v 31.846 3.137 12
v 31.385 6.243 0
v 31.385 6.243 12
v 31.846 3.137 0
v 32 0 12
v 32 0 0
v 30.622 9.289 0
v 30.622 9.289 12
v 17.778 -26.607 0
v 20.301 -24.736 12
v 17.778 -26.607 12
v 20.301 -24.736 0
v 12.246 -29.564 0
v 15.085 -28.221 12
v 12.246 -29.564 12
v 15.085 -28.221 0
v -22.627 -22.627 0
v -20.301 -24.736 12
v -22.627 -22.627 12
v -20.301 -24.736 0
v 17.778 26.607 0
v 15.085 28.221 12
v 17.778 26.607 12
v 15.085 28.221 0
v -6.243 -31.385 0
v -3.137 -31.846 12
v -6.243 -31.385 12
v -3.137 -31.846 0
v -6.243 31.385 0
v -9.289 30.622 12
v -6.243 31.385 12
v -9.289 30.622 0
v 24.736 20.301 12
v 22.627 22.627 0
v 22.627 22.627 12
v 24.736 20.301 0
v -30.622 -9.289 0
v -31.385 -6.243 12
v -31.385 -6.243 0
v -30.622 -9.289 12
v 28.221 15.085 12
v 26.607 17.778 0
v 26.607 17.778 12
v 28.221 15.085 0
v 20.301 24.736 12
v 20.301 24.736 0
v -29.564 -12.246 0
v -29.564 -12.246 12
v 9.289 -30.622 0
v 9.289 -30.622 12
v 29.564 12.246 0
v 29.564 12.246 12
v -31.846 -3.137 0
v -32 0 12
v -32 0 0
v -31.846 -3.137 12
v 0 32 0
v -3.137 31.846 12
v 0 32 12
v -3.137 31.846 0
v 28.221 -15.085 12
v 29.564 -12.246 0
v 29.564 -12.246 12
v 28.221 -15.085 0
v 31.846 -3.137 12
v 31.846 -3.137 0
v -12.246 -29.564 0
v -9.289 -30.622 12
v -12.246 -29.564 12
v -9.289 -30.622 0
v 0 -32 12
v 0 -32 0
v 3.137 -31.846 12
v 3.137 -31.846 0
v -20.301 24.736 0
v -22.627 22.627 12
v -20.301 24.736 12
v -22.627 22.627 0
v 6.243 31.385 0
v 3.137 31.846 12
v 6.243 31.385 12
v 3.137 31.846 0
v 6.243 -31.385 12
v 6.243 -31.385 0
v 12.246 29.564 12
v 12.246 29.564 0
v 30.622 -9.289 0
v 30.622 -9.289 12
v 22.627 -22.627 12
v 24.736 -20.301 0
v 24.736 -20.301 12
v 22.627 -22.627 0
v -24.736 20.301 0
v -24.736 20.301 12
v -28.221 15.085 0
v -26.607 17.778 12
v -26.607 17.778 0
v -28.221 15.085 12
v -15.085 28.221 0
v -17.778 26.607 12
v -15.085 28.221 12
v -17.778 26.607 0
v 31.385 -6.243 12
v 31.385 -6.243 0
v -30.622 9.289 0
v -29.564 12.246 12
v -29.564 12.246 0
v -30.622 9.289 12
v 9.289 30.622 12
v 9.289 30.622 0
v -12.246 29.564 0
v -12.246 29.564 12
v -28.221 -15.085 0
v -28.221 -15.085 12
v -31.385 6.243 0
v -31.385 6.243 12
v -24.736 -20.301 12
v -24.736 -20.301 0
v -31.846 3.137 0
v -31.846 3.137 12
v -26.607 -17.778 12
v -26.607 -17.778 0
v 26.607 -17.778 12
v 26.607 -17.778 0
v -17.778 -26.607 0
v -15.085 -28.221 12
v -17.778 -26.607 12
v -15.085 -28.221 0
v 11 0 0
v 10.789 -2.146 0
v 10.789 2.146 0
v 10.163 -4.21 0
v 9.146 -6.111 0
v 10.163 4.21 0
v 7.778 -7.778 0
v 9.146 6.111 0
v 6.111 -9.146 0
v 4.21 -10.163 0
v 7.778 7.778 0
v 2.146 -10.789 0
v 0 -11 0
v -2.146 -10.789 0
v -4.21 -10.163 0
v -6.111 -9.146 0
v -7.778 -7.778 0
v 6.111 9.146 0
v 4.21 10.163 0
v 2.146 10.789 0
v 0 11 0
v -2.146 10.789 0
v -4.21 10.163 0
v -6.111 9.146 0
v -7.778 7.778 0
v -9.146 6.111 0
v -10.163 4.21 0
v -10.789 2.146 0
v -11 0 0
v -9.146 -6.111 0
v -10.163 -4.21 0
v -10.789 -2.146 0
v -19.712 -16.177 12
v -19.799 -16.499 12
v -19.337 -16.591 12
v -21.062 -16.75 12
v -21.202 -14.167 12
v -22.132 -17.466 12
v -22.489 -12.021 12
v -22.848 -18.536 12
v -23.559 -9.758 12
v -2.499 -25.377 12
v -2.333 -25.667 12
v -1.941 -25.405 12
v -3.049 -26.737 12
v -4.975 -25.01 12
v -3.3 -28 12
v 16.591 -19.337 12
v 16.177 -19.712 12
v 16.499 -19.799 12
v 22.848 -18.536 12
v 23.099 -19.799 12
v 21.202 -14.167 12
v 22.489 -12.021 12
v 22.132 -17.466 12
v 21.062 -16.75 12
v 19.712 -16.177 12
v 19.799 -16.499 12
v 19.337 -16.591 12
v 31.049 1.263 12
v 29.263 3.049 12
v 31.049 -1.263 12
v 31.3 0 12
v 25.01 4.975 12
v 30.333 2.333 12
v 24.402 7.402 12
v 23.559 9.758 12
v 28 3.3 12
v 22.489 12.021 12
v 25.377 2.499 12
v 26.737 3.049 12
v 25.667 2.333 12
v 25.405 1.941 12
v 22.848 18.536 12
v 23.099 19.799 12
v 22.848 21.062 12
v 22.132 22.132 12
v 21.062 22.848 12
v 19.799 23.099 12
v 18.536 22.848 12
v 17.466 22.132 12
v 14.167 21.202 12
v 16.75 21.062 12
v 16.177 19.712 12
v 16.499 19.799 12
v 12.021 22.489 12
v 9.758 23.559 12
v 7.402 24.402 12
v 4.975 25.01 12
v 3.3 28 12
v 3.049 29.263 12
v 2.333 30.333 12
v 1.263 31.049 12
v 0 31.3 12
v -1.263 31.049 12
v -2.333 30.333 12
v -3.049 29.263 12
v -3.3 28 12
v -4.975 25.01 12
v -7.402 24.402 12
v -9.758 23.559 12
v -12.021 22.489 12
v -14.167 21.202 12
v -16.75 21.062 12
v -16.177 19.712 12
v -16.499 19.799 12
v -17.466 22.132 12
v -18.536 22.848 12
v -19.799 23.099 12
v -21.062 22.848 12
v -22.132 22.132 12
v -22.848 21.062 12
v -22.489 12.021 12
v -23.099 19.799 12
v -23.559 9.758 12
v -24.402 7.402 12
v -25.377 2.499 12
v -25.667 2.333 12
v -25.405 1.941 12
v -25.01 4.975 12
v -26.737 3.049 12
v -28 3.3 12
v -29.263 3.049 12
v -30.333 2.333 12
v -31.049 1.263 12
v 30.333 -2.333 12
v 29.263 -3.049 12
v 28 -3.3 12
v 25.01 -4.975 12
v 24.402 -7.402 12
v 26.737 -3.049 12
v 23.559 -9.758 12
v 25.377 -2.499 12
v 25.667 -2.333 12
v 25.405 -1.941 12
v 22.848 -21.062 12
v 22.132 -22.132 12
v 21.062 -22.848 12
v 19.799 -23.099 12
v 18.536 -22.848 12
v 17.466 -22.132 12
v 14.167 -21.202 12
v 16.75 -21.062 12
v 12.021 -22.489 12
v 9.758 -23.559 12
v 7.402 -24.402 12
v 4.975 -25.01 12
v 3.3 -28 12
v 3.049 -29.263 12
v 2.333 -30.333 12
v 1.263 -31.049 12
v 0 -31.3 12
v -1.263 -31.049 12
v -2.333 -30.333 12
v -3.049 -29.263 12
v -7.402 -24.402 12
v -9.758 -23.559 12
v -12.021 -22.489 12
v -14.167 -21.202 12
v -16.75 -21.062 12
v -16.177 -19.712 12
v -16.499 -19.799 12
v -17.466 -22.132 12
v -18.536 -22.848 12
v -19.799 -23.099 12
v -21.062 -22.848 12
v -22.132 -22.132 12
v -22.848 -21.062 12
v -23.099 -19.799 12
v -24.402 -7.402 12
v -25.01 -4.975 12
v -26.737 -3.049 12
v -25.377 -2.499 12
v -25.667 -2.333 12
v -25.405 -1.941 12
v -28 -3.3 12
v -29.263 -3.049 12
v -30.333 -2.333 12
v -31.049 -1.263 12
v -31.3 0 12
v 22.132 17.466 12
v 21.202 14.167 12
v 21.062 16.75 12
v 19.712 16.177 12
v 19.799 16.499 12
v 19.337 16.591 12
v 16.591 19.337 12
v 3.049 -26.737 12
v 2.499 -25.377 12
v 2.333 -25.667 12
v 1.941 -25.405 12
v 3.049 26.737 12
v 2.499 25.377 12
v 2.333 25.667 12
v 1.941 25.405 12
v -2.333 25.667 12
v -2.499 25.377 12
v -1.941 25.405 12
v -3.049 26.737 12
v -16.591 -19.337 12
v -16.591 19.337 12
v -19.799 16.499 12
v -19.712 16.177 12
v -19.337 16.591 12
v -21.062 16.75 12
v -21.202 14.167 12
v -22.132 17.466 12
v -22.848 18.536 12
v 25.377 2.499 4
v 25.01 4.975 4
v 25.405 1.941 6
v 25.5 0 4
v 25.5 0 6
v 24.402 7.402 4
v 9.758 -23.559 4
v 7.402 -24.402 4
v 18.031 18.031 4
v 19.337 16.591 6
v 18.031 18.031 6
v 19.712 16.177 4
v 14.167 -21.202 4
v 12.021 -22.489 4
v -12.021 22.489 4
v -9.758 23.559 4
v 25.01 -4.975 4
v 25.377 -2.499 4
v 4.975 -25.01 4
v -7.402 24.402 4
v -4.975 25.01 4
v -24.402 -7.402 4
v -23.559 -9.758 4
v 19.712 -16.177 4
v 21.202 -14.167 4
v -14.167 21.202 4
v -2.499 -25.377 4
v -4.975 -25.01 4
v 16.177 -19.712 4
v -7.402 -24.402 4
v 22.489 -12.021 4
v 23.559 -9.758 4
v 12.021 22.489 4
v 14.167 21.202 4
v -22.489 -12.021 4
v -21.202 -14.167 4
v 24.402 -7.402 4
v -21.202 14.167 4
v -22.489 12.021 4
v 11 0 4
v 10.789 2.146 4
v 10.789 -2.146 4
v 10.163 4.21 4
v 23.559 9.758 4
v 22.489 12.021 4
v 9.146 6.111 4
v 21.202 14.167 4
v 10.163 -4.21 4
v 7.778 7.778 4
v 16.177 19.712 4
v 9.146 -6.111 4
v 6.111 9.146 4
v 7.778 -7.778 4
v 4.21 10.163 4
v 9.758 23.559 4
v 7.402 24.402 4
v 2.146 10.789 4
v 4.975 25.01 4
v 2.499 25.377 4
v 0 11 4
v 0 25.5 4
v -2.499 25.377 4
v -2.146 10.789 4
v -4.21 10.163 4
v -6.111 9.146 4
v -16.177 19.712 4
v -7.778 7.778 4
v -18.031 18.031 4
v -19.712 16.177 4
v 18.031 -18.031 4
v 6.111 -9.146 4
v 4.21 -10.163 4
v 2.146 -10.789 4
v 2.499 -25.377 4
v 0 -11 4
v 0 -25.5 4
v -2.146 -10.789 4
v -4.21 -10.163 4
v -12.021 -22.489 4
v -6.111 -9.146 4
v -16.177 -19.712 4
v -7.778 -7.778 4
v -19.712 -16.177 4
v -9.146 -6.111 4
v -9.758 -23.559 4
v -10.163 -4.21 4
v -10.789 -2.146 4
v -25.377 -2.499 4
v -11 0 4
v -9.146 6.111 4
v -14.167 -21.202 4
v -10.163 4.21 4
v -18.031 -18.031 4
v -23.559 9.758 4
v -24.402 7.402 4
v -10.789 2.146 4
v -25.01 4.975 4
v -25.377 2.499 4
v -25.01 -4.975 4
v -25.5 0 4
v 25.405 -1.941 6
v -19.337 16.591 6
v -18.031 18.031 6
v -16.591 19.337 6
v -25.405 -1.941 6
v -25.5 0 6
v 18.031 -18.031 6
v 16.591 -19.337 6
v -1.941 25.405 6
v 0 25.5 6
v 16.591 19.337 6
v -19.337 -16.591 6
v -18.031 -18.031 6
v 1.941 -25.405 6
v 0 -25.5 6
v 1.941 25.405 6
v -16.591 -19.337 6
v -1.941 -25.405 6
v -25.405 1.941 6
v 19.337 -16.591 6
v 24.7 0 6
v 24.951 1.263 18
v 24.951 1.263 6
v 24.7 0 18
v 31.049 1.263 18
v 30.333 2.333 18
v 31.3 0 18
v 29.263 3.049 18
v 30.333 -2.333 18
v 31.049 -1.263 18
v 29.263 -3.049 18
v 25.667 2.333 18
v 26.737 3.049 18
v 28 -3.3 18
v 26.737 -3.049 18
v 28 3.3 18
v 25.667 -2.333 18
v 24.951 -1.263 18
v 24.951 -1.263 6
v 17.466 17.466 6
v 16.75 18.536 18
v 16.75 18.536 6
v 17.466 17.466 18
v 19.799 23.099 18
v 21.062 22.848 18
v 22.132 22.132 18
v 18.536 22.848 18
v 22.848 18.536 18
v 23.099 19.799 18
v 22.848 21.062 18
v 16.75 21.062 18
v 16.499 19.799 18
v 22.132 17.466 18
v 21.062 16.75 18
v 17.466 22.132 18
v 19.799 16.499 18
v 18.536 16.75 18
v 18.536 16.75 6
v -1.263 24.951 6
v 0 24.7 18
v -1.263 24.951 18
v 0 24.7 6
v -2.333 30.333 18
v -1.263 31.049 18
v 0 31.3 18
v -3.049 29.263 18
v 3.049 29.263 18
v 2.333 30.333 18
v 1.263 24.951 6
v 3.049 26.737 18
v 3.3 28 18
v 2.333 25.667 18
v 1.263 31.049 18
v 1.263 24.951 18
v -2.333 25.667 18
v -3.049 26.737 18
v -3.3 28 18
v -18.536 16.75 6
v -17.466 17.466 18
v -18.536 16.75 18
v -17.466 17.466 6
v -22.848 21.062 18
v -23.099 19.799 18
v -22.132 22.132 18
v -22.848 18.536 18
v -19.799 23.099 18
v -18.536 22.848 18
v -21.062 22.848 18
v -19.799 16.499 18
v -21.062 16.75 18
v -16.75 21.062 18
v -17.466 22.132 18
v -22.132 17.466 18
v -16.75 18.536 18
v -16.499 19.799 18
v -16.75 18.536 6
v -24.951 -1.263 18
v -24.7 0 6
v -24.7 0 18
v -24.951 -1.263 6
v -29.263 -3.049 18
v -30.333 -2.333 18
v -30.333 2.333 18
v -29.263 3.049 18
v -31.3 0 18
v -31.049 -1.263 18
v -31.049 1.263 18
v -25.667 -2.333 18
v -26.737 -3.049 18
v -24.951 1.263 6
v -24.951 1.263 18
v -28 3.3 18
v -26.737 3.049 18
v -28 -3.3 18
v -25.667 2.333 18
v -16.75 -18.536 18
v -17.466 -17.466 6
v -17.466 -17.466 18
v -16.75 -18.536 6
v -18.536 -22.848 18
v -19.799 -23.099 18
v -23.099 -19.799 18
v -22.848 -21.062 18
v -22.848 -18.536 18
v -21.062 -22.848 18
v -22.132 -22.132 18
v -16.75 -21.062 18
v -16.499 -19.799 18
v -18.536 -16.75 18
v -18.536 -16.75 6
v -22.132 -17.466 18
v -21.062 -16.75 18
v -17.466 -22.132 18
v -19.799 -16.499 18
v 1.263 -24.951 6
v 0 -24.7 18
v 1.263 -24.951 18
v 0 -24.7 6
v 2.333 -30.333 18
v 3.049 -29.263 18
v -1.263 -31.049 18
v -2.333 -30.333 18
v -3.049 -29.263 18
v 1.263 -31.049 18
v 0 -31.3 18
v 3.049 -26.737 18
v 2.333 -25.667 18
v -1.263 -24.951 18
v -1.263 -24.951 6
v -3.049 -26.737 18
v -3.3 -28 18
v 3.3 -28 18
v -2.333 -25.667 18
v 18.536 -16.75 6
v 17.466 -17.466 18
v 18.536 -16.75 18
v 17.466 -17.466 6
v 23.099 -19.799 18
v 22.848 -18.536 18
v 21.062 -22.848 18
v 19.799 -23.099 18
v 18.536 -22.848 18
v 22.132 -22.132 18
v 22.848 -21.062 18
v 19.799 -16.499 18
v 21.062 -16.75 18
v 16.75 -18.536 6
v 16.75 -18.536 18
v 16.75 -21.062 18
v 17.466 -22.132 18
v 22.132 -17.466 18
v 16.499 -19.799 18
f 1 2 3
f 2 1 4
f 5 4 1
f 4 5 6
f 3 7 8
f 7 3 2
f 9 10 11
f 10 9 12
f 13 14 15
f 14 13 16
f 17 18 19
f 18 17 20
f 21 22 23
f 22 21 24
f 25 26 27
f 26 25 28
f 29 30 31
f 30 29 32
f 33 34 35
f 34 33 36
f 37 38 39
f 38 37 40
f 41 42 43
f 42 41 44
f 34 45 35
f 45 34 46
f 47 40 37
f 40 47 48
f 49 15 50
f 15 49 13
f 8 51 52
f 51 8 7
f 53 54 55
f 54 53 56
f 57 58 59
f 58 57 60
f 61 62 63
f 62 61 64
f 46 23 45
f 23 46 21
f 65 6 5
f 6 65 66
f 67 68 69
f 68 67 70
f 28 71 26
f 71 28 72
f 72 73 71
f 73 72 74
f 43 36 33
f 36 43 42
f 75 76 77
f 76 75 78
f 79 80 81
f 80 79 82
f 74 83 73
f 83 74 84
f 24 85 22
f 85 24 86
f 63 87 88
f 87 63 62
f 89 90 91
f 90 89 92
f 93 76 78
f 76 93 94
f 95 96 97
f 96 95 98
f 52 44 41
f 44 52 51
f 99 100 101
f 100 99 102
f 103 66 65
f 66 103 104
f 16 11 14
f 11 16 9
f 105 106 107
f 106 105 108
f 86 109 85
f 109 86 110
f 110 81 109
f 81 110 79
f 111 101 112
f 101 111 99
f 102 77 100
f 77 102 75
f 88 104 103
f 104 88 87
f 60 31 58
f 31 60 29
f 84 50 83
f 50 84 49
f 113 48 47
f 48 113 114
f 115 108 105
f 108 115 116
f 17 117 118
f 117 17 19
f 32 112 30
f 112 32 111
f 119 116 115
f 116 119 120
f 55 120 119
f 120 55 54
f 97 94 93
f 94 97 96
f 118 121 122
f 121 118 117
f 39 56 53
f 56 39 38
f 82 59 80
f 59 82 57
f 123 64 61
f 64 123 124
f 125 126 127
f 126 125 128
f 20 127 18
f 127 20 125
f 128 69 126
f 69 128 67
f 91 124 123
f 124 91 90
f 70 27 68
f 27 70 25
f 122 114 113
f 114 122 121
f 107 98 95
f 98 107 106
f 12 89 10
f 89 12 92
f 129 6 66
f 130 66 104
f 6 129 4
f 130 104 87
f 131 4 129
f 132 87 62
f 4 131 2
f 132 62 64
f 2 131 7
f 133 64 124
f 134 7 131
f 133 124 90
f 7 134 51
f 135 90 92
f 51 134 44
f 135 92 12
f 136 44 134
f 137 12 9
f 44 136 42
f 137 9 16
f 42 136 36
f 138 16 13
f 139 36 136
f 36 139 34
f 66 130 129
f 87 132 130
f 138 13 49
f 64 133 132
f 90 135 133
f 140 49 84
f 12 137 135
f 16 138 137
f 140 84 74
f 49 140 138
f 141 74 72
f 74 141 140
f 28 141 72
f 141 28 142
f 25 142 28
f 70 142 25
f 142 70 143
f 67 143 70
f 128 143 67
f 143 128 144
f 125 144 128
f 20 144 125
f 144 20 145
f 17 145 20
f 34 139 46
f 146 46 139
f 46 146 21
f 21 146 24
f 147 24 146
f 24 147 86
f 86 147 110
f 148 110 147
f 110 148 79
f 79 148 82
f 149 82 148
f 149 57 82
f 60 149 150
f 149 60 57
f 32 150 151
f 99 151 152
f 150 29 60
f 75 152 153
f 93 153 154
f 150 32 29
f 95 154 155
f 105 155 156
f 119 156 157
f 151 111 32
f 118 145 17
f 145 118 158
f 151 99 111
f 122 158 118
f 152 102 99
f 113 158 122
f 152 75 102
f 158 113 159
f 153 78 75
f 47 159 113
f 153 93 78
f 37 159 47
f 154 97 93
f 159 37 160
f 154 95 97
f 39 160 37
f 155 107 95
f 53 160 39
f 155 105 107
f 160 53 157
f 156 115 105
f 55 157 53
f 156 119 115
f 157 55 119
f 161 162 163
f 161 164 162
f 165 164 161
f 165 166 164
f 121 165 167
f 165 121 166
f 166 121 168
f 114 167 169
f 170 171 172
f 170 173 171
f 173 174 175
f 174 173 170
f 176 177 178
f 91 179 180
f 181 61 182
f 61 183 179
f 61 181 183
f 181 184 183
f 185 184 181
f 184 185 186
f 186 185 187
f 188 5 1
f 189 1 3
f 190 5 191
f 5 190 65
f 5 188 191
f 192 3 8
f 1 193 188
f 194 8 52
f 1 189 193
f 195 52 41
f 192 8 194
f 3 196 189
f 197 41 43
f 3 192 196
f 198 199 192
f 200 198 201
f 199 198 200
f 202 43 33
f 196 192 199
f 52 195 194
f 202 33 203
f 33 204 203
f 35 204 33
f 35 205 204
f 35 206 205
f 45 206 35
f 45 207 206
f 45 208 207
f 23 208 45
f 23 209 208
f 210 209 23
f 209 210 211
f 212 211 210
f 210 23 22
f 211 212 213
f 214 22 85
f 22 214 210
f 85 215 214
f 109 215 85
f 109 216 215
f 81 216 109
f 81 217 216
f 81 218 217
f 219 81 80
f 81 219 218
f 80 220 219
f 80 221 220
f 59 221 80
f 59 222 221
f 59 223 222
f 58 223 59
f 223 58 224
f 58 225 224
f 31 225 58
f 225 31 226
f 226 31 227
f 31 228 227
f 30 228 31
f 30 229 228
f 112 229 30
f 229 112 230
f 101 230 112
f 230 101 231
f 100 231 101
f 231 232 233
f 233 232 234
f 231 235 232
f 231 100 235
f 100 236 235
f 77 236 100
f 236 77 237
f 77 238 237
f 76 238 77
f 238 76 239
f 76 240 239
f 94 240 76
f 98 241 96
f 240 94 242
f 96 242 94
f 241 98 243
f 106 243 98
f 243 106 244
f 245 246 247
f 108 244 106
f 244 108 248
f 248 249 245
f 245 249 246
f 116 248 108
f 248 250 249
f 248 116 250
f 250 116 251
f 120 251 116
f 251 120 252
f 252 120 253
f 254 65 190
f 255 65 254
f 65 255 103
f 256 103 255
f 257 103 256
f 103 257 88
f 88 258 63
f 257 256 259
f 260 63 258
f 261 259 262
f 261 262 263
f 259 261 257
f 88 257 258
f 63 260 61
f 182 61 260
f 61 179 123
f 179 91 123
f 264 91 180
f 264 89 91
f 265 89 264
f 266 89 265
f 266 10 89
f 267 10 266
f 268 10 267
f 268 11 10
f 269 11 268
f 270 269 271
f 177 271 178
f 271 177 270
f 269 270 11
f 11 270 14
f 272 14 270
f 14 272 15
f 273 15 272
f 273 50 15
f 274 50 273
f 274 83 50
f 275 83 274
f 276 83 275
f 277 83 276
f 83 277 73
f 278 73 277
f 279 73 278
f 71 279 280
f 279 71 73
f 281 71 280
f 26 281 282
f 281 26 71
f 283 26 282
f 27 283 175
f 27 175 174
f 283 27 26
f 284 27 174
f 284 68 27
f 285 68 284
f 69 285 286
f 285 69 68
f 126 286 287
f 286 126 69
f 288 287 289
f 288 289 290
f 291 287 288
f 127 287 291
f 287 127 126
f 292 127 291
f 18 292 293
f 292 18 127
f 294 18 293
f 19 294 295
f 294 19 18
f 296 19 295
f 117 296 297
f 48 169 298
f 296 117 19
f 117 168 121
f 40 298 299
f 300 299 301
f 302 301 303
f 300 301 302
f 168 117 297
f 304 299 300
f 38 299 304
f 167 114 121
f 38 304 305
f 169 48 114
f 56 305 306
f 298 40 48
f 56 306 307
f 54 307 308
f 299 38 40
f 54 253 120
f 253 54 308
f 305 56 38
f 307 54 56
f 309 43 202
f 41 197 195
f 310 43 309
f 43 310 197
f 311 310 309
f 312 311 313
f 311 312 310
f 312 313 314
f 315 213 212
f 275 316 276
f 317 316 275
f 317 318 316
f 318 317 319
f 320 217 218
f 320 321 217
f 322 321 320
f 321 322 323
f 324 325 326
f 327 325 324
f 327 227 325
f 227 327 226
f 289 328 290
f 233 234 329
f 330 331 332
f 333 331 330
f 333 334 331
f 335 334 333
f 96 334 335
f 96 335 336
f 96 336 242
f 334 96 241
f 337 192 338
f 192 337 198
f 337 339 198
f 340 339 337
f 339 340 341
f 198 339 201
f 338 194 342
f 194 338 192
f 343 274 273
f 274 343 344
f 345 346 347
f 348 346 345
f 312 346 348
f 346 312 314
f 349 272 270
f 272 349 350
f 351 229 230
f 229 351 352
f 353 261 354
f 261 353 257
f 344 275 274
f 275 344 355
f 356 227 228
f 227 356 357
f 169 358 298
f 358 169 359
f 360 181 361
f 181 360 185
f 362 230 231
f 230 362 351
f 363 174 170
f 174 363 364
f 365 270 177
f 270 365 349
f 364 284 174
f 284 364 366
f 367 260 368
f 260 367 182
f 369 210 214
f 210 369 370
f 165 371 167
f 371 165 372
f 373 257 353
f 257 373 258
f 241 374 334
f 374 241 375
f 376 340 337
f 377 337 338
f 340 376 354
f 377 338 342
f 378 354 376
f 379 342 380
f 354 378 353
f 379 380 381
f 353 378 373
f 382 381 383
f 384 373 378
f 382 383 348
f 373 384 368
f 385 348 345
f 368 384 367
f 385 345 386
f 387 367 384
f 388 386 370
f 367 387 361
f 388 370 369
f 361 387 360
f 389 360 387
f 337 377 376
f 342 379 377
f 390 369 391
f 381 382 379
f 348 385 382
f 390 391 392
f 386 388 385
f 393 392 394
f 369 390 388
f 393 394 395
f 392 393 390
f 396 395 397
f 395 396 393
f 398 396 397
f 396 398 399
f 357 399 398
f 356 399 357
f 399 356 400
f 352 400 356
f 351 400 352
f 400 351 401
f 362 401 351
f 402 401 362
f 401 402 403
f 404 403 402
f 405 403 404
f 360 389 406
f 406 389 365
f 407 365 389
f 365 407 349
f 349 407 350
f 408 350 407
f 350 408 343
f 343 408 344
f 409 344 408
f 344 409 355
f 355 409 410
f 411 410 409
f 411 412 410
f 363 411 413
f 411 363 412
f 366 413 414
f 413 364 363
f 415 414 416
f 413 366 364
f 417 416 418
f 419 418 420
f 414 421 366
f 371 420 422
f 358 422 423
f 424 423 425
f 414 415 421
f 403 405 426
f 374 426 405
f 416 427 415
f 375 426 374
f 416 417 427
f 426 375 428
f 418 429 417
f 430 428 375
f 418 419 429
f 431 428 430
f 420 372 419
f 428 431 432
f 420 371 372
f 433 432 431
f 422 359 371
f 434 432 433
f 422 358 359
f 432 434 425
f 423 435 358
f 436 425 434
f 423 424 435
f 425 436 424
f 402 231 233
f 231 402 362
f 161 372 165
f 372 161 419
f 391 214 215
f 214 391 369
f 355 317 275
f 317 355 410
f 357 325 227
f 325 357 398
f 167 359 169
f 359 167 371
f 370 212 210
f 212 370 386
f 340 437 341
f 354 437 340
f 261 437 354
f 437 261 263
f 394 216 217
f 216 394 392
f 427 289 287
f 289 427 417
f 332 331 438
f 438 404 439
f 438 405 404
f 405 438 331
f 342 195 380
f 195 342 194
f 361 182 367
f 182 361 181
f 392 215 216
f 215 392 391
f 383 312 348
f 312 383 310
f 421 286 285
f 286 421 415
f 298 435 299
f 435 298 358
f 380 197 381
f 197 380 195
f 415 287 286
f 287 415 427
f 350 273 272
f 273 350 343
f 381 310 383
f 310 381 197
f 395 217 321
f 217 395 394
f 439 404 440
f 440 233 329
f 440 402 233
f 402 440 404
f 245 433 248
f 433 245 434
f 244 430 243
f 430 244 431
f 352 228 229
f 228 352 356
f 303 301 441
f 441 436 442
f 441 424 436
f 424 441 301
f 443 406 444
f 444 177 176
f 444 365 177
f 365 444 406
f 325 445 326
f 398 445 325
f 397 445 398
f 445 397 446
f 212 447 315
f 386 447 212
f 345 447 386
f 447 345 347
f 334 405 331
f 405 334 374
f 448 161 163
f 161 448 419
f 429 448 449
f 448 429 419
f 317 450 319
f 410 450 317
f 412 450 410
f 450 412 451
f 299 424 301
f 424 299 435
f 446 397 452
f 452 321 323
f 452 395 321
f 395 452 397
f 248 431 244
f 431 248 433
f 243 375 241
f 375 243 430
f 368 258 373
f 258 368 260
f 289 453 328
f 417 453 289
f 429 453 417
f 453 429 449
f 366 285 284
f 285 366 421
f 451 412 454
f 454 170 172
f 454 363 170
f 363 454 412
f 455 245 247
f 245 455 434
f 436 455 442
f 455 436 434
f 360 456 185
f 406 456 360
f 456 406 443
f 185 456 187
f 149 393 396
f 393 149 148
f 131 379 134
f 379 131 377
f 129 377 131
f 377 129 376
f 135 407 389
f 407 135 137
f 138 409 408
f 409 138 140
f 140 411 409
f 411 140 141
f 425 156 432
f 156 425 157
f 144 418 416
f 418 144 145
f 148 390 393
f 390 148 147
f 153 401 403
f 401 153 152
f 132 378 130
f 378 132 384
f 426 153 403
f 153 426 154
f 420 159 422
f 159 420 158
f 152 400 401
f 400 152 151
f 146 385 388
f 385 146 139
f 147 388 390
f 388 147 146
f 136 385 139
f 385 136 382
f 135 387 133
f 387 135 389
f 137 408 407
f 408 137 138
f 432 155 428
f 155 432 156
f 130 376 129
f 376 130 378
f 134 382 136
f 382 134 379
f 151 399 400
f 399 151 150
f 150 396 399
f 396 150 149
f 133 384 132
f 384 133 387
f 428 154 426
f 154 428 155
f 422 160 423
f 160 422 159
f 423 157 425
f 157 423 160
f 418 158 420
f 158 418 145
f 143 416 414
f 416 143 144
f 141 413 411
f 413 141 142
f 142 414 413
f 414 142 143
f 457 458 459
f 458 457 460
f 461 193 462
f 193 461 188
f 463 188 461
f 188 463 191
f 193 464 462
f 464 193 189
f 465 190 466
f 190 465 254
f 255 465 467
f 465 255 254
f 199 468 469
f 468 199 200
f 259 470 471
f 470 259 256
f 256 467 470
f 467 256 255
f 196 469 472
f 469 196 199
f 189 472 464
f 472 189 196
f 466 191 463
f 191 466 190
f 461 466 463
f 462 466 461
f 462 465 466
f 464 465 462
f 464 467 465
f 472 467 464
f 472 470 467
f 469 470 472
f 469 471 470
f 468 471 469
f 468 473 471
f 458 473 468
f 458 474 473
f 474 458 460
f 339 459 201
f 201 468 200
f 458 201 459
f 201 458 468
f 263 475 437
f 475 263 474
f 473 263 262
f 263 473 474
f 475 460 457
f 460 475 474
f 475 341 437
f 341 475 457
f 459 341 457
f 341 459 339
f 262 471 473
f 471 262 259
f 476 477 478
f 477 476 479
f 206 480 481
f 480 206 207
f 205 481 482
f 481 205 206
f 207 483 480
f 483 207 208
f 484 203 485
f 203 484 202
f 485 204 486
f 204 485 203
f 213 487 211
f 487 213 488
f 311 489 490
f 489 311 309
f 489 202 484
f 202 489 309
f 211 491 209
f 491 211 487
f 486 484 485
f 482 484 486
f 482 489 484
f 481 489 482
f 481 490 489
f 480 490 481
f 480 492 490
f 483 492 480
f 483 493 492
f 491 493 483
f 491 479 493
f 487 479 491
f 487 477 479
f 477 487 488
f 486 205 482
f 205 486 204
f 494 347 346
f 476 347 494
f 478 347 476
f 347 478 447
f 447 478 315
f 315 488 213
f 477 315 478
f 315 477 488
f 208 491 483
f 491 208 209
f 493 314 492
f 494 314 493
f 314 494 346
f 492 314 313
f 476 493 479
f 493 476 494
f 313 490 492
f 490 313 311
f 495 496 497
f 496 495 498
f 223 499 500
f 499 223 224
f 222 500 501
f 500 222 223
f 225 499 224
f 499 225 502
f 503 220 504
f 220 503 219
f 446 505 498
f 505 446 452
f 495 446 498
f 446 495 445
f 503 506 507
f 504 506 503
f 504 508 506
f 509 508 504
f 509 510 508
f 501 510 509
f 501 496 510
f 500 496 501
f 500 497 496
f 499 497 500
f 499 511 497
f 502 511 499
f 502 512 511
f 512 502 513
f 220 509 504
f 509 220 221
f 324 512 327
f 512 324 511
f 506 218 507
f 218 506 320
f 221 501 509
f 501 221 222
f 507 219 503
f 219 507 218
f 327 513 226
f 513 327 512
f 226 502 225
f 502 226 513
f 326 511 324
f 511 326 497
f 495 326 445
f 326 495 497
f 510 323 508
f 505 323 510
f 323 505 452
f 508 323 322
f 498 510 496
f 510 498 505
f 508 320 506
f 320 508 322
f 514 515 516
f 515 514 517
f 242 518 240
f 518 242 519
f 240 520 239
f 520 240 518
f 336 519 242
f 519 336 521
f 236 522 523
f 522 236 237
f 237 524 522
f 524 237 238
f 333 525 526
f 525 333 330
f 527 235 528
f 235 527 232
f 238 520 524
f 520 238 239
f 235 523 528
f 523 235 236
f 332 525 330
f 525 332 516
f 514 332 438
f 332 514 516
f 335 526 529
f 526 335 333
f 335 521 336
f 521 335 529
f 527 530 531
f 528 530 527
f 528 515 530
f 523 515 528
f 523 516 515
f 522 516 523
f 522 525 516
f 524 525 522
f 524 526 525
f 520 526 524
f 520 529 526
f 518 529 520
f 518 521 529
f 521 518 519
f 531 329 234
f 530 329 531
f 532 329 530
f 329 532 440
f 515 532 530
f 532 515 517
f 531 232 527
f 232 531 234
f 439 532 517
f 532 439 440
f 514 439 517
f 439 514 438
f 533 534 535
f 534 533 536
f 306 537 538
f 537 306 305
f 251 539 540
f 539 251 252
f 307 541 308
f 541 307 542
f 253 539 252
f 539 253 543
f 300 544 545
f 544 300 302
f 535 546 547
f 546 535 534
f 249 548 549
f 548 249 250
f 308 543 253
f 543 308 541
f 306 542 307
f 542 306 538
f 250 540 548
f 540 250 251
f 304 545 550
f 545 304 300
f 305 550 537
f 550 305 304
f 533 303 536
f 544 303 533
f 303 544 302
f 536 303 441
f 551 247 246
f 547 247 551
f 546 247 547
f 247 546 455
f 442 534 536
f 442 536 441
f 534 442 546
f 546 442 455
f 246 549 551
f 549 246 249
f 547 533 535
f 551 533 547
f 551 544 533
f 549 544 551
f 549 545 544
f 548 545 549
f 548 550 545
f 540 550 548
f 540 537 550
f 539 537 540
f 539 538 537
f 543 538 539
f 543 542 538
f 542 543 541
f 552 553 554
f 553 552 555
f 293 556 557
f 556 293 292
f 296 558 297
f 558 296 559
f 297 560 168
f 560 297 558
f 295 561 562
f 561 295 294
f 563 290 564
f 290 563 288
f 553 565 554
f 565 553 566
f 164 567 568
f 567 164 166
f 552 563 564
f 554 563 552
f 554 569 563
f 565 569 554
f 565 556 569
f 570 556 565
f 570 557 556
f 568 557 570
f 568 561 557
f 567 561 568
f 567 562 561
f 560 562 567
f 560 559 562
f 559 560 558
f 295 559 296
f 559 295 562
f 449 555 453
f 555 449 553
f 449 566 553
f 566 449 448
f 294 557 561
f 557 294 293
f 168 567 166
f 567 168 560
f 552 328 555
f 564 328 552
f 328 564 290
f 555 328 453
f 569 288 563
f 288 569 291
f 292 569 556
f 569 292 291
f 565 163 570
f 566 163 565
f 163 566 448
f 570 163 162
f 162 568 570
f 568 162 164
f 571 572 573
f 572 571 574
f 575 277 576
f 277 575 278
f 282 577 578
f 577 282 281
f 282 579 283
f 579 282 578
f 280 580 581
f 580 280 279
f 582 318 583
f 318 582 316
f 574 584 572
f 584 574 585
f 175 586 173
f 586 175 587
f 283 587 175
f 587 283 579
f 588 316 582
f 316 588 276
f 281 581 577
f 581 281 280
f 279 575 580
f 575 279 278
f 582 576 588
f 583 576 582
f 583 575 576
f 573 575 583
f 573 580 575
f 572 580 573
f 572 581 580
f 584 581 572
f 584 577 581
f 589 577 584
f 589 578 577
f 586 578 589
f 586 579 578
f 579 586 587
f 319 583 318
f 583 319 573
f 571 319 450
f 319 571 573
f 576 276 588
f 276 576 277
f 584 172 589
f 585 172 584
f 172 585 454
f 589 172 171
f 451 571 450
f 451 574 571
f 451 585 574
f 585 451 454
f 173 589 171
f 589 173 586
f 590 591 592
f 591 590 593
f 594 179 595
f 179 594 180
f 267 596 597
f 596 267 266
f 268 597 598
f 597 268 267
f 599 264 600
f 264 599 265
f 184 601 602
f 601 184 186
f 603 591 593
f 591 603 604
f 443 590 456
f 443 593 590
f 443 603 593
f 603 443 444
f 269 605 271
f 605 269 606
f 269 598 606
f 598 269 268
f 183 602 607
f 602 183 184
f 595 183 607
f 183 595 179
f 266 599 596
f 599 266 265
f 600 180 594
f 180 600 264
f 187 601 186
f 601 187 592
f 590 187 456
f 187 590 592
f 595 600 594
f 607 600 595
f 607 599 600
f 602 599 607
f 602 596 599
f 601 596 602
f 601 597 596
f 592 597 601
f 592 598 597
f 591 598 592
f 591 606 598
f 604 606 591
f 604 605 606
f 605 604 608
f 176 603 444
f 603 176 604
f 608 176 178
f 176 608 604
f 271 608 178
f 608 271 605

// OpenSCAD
// 2 inch tri-clamp style flange (51 mm)
module flange_adapter() {
  difference() {
    cylinder(h=12, d=64, $fn=64);
    translate([0, 0, 4]) cylinder(h=12, d=51, $fn=64);
    translate([0, 0, -1]) cylinder(h=8, d=22, $fn=32);
  }
  for (a = [0:45:315])
    rotate([0, 0, a]) translate([28, 0, 6]) cylinder(h=12, d=6.6, $fn=16);
}
flange_adapter();
